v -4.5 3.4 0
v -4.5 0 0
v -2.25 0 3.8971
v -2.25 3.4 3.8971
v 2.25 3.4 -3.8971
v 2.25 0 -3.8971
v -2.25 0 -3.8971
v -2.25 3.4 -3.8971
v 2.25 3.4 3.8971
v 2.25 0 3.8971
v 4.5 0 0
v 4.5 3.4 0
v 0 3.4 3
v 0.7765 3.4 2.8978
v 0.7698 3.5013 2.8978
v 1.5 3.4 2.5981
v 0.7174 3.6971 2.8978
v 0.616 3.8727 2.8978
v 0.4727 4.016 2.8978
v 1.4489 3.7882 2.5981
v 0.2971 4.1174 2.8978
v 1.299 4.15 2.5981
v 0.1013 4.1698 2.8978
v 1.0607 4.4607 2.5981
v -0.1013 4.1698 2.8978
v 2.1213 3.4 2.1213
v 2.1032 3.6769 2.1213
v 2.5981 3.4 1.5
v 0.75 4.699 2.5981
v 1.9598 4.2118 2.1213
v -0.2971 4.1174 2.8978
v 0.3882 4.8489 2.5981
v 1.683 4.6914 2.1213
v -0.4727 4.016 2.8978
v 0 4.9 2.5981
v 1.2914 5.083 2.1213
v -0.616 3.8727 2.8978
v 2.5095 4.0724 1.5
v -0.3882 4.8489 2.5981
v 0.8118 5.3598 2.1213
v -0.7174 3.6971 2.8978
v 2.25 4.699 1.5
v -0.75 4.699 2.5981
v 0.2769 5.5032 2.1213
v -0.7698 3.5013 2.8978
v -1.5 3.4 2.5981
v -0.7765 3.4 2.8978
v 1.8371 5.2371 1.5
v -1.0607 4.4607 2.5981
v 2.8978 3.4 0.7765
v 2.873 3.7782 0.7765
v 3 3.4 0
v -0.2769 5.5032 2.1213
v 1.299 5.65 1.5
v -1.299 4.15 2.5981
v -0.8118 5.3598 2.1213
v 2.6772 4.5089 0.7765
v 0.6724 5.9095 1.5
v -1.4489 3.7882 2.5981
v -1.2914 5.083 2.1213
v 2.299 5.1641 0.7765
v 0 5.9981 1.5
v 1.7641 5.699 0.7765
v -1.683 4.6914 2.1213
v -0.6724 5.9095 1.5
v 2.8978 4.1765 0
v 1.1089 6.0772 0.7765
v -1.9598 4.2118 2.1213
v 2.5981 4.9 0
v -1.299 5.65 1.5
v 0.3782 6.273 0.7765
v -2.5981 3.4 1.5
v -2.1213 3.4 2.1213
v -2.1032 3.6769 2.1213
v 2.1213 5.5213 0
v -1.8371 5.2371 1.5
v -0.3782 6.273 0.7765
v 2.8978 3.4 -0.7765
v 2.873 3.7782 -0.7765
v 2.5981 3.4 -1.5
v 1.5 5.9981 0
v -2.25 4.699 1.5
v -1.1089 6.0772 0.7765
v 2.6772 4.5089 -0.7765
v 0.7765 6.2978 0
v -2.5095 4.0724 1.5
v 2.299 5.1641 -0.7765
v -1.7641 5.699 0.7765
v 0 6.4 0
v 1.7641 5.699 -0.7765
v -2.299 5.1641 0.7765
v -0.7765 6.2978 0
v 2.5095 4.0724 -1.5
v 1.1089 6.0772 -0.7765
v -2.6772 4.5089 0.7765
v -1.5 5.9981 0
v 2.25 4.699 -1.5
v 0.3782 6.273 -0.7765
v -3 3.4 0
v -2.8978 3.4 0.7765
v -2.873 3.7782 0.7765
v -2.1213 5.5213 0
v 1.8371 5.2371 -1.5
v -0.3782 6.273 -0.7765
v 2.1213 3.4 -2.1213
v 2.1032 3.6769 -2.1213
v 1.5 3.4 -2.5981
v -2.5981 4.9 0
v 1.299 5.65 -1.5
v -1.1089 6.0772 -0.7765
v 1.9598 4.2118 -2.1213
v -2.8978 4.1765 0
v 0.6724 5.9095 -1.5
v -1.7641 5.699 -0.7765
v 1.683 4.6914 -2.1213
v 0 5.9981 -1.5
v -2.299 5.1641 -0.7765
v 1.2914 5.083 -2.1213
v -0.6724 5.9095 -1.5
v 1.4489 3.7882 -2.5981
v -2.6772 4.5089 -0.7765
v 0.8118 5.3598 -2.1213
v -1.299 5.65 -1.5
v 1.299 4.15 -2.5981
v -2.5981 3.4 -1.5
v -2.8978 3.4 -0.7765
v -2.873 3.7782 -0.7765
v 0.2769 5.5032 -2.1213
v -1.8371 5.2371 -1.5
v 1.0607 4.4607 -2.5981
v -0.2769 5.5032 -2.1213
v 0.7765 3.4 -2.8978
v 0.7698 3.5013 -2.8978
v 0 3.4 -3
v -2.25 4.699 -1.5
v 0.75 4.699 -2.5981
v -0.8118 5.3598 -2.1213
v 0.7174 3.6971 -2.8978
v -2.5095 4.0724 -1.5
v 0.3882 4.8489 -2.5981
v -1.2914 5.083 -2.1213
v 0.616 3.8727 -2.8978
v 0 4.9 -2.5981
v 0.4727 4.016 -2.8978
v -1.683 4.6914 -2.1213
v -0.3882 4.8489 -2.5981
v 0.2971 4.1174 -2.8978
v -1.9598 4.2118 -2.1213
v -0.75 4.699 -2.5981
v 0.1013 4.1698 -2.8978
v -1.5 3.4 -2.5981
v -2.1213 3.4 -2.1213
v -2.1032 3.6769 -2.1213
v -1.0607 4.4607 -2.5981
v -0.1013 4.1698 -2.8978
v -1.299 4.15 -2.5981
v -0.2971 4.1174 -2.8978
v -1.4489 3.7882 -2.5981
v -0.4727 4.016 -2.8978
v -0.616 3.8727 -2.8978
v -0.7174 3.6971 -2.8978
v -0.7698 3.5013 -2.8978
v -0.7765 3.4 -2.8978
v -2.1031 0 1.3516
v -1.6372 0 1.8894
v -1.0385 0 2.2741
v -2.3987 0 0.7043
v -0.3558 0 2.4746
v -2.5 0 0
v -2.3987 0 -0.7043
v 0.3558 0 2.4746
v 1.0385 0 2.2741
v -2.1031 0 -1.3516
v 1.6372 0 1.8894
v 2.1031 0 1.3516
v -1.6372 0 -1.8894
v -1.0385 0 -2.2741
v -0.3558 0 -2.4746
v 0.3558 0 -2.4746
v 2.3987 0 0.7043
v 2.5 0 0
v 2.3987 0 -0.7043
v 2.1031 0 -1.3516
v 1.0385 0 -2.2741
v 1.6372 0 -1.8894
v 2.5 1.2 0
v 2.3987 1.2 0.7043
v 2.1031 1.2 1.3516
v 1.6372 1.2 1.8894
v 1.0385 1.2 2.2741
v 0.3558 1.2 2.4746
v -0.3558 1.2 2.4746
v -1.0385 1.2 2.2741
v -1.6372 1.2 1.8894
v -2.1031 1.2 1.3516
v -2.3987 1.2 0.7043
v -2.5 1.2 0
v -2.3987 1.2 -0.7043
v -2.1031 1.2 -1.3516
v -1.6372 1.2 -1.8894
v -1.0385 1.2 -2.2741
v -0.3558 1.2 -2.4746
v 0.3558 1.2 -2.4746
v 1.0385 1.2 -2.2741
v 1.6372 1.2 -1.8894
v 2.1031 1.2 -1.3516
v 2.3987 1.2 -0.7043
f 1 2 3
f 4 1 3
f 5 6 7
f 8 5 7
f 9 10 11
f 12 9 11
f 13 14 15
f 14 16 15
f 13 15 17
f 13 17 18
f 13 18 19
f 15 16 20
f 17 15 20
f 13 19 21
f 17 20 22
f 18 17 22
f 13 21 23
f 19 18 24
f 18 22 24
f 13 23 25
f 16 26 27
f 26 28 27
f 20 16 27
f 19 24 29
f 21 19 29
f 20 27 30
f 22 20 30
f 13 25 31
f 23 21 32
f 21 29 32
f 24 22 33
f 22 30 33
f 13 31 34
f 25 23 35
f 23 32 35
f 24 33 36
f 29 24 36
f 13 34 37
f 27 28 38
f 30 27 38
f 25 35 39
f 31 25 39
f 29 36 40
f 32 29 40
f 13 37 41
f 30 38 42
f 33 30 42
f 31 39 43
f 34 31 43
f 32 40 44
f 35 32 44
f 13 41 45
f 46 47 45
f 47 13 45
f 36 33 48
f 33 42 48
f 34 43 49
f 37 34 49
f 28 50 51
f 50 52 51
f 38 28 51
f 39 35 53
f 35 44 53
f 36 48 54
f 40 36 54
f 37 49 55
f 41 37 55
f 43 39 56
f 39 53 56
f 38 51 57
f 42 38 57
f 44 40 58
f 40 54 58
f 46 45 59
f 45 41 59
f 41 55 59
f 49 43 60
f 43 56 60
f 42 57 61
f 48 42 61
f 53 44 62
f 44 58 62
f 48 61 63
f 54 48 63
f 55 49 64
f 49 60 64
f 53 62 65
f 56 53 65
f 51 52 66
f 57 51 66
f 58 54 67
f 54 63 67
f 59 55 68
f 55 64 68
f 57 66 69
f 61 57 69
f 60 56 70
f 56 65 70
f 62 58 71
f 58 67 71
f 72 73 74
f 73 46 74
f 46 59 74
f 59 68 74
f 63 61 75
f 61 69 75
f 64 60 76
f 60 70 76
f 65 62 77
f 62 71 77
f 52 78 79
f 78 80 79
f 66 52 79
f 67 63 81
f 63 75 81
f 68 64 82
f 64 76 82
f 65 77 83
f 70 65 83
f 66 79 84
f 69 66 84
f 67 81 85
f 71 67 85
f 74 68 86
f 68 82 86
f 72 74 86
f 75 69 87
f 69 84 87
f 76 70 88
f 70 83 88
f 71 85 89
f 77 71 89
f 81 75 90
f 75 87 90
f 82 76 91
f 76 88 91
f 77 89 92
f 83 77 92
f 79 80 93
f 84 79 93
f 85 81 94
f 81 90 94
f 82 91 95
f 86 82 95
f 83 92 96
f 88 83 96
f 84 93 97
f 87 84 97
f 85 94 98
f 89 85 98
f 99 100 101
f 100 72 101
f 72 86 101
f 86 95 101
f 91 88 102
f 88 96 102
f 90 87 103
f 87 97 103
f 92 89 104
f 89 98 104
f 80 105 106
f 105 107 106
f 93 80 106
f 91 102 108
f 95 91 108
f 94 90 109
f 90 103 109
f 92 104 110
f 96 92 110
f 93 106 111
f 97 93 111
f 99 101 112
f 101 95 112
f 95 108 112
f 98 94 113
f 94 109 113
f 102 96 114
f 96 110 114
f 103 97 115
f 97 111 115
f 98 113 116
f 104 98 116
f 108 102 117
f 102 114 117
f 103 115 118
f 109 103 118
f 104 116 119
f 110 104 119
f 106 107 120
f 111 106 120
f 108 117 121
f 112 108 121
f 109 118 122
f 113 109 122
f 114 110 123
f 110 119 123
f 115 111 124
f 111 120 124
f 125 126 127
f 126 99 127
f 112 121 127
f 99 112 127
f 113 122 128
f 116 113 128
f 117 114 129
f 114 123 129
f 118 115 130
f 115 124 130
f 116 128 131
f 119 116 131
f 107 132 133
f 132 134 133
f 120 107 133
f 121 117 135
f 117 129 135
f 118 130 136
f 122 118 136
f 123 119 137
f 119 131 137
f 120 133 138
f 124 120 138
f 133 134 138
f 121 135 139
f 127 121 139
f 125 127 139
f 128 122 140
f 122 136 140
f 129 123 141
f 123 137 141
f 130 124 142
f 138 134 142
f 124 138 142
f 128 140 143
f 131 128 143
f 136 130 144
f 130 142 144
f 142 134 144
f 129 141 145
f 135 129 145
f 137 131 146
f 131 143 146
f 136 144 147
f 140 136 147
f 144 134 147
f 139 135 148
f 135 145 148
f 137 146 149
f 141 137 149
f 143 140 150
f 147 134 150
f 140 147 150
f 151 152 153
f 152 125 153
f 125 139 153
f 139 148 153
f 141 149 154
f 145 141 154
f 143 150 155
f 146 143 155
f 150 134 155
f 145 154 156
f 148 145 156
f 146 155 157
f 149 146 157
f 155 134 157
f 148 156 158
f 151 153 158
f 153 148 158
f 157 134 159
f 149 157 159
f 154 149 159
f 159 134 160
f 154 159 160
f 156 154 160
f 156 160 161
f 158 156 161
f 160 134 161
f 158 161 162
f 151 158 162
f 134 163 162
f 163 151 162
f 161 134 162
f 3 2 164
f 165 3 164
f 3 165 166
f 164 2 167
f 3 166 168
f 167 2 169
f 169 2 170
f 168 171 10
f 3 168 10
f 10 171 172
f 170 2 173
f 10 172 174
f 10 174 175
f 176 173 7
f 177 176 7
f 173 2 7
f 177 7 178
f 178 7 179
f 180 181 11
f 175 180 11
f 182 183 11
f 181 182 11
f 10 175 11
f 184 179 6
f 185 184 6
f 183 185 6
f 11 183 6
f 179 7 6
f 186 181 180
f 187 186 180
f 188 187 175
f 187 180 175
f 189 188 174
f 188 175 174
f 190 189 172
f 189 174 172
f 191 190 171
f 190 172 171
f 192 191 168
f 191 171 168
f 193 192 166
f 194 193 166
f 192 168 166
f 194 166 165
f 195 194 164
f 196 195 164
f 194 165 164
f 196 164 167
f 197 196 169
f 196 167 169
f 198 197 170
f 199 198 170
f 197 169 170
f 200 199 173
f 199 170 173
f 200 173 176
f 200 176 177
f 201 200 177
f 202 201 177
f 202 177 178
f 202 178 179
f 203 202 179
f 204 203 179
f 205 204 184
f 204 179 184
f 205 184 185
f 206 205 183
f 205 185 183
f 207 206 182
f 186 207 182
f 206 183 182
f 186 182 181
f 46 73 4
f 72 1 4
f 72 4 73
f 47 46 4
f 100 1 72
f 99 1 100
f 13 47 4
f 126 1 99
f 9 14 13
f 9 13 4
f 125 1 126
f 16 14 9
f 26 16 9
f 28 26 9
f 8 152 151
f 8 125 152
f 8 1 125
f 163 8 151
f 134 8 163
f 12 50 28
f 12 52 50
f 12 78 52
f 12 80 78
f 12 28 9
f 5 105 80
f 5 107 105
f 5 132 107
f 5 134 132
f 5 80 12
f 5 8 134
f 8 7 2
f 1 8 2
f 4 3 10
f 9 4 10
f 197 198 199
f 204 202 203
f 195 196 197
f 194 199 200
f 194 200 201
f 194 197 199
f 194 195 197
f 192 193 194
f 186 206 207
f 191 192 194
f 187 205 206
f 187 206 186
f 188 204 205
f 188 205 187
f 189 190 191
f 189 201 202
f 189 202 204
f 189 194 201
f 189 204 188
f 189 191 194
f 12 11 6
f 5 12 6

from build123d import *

# Parameters (mm, degrees)
BOSS_EXTRUDE1_DEPTH = 3.4
SKETCH4_R           = 2.5
CUT_EXTRUDE1_DEPTH  = 1.2


with BuildPart() as part:
    # Sketch1 → Boss-Extrude1 (new body)
    with BuildSketch(Plane(origin=(0, 0, 0), x_dir=(1, 0, 0), z_dir=(0, 1, 0))):
        Polygon((2.25, 3.897114317), (-2.25, 3.897114317), (-4.5, 0), (-2.25, -3.897114317), (2.25, -3.897114317), (4.5, 0), align=None)
    extrude(amount=BOSS_EXTRUDE1_DEPTH)

    # Sketch2 → Revolve1 (revolve)
    with BuildSketch(Plane(origin=(0, 3.4, 0), x_dir=(1, 0, 0), z_dir=(0, 1, 0))):
        with BuildLine():
            Line((0, 3), (0, -3))
            ThreePointArc((0, -3), (3, 0), (0, 3))
        make_face()
    revolve(axis=Axis((0, 3.4, -3), (0, 0, 1)))

    # Sketch4 → Cut-Extrude1 (cut)
    with BuildSketch(Plane.XZ):
        Circle(SKETCH4_R)
    extrude(amount=-CUT_EXTRUDE1_DEPTH, mode=Mode.SUBTRACT)


solid = part.part
